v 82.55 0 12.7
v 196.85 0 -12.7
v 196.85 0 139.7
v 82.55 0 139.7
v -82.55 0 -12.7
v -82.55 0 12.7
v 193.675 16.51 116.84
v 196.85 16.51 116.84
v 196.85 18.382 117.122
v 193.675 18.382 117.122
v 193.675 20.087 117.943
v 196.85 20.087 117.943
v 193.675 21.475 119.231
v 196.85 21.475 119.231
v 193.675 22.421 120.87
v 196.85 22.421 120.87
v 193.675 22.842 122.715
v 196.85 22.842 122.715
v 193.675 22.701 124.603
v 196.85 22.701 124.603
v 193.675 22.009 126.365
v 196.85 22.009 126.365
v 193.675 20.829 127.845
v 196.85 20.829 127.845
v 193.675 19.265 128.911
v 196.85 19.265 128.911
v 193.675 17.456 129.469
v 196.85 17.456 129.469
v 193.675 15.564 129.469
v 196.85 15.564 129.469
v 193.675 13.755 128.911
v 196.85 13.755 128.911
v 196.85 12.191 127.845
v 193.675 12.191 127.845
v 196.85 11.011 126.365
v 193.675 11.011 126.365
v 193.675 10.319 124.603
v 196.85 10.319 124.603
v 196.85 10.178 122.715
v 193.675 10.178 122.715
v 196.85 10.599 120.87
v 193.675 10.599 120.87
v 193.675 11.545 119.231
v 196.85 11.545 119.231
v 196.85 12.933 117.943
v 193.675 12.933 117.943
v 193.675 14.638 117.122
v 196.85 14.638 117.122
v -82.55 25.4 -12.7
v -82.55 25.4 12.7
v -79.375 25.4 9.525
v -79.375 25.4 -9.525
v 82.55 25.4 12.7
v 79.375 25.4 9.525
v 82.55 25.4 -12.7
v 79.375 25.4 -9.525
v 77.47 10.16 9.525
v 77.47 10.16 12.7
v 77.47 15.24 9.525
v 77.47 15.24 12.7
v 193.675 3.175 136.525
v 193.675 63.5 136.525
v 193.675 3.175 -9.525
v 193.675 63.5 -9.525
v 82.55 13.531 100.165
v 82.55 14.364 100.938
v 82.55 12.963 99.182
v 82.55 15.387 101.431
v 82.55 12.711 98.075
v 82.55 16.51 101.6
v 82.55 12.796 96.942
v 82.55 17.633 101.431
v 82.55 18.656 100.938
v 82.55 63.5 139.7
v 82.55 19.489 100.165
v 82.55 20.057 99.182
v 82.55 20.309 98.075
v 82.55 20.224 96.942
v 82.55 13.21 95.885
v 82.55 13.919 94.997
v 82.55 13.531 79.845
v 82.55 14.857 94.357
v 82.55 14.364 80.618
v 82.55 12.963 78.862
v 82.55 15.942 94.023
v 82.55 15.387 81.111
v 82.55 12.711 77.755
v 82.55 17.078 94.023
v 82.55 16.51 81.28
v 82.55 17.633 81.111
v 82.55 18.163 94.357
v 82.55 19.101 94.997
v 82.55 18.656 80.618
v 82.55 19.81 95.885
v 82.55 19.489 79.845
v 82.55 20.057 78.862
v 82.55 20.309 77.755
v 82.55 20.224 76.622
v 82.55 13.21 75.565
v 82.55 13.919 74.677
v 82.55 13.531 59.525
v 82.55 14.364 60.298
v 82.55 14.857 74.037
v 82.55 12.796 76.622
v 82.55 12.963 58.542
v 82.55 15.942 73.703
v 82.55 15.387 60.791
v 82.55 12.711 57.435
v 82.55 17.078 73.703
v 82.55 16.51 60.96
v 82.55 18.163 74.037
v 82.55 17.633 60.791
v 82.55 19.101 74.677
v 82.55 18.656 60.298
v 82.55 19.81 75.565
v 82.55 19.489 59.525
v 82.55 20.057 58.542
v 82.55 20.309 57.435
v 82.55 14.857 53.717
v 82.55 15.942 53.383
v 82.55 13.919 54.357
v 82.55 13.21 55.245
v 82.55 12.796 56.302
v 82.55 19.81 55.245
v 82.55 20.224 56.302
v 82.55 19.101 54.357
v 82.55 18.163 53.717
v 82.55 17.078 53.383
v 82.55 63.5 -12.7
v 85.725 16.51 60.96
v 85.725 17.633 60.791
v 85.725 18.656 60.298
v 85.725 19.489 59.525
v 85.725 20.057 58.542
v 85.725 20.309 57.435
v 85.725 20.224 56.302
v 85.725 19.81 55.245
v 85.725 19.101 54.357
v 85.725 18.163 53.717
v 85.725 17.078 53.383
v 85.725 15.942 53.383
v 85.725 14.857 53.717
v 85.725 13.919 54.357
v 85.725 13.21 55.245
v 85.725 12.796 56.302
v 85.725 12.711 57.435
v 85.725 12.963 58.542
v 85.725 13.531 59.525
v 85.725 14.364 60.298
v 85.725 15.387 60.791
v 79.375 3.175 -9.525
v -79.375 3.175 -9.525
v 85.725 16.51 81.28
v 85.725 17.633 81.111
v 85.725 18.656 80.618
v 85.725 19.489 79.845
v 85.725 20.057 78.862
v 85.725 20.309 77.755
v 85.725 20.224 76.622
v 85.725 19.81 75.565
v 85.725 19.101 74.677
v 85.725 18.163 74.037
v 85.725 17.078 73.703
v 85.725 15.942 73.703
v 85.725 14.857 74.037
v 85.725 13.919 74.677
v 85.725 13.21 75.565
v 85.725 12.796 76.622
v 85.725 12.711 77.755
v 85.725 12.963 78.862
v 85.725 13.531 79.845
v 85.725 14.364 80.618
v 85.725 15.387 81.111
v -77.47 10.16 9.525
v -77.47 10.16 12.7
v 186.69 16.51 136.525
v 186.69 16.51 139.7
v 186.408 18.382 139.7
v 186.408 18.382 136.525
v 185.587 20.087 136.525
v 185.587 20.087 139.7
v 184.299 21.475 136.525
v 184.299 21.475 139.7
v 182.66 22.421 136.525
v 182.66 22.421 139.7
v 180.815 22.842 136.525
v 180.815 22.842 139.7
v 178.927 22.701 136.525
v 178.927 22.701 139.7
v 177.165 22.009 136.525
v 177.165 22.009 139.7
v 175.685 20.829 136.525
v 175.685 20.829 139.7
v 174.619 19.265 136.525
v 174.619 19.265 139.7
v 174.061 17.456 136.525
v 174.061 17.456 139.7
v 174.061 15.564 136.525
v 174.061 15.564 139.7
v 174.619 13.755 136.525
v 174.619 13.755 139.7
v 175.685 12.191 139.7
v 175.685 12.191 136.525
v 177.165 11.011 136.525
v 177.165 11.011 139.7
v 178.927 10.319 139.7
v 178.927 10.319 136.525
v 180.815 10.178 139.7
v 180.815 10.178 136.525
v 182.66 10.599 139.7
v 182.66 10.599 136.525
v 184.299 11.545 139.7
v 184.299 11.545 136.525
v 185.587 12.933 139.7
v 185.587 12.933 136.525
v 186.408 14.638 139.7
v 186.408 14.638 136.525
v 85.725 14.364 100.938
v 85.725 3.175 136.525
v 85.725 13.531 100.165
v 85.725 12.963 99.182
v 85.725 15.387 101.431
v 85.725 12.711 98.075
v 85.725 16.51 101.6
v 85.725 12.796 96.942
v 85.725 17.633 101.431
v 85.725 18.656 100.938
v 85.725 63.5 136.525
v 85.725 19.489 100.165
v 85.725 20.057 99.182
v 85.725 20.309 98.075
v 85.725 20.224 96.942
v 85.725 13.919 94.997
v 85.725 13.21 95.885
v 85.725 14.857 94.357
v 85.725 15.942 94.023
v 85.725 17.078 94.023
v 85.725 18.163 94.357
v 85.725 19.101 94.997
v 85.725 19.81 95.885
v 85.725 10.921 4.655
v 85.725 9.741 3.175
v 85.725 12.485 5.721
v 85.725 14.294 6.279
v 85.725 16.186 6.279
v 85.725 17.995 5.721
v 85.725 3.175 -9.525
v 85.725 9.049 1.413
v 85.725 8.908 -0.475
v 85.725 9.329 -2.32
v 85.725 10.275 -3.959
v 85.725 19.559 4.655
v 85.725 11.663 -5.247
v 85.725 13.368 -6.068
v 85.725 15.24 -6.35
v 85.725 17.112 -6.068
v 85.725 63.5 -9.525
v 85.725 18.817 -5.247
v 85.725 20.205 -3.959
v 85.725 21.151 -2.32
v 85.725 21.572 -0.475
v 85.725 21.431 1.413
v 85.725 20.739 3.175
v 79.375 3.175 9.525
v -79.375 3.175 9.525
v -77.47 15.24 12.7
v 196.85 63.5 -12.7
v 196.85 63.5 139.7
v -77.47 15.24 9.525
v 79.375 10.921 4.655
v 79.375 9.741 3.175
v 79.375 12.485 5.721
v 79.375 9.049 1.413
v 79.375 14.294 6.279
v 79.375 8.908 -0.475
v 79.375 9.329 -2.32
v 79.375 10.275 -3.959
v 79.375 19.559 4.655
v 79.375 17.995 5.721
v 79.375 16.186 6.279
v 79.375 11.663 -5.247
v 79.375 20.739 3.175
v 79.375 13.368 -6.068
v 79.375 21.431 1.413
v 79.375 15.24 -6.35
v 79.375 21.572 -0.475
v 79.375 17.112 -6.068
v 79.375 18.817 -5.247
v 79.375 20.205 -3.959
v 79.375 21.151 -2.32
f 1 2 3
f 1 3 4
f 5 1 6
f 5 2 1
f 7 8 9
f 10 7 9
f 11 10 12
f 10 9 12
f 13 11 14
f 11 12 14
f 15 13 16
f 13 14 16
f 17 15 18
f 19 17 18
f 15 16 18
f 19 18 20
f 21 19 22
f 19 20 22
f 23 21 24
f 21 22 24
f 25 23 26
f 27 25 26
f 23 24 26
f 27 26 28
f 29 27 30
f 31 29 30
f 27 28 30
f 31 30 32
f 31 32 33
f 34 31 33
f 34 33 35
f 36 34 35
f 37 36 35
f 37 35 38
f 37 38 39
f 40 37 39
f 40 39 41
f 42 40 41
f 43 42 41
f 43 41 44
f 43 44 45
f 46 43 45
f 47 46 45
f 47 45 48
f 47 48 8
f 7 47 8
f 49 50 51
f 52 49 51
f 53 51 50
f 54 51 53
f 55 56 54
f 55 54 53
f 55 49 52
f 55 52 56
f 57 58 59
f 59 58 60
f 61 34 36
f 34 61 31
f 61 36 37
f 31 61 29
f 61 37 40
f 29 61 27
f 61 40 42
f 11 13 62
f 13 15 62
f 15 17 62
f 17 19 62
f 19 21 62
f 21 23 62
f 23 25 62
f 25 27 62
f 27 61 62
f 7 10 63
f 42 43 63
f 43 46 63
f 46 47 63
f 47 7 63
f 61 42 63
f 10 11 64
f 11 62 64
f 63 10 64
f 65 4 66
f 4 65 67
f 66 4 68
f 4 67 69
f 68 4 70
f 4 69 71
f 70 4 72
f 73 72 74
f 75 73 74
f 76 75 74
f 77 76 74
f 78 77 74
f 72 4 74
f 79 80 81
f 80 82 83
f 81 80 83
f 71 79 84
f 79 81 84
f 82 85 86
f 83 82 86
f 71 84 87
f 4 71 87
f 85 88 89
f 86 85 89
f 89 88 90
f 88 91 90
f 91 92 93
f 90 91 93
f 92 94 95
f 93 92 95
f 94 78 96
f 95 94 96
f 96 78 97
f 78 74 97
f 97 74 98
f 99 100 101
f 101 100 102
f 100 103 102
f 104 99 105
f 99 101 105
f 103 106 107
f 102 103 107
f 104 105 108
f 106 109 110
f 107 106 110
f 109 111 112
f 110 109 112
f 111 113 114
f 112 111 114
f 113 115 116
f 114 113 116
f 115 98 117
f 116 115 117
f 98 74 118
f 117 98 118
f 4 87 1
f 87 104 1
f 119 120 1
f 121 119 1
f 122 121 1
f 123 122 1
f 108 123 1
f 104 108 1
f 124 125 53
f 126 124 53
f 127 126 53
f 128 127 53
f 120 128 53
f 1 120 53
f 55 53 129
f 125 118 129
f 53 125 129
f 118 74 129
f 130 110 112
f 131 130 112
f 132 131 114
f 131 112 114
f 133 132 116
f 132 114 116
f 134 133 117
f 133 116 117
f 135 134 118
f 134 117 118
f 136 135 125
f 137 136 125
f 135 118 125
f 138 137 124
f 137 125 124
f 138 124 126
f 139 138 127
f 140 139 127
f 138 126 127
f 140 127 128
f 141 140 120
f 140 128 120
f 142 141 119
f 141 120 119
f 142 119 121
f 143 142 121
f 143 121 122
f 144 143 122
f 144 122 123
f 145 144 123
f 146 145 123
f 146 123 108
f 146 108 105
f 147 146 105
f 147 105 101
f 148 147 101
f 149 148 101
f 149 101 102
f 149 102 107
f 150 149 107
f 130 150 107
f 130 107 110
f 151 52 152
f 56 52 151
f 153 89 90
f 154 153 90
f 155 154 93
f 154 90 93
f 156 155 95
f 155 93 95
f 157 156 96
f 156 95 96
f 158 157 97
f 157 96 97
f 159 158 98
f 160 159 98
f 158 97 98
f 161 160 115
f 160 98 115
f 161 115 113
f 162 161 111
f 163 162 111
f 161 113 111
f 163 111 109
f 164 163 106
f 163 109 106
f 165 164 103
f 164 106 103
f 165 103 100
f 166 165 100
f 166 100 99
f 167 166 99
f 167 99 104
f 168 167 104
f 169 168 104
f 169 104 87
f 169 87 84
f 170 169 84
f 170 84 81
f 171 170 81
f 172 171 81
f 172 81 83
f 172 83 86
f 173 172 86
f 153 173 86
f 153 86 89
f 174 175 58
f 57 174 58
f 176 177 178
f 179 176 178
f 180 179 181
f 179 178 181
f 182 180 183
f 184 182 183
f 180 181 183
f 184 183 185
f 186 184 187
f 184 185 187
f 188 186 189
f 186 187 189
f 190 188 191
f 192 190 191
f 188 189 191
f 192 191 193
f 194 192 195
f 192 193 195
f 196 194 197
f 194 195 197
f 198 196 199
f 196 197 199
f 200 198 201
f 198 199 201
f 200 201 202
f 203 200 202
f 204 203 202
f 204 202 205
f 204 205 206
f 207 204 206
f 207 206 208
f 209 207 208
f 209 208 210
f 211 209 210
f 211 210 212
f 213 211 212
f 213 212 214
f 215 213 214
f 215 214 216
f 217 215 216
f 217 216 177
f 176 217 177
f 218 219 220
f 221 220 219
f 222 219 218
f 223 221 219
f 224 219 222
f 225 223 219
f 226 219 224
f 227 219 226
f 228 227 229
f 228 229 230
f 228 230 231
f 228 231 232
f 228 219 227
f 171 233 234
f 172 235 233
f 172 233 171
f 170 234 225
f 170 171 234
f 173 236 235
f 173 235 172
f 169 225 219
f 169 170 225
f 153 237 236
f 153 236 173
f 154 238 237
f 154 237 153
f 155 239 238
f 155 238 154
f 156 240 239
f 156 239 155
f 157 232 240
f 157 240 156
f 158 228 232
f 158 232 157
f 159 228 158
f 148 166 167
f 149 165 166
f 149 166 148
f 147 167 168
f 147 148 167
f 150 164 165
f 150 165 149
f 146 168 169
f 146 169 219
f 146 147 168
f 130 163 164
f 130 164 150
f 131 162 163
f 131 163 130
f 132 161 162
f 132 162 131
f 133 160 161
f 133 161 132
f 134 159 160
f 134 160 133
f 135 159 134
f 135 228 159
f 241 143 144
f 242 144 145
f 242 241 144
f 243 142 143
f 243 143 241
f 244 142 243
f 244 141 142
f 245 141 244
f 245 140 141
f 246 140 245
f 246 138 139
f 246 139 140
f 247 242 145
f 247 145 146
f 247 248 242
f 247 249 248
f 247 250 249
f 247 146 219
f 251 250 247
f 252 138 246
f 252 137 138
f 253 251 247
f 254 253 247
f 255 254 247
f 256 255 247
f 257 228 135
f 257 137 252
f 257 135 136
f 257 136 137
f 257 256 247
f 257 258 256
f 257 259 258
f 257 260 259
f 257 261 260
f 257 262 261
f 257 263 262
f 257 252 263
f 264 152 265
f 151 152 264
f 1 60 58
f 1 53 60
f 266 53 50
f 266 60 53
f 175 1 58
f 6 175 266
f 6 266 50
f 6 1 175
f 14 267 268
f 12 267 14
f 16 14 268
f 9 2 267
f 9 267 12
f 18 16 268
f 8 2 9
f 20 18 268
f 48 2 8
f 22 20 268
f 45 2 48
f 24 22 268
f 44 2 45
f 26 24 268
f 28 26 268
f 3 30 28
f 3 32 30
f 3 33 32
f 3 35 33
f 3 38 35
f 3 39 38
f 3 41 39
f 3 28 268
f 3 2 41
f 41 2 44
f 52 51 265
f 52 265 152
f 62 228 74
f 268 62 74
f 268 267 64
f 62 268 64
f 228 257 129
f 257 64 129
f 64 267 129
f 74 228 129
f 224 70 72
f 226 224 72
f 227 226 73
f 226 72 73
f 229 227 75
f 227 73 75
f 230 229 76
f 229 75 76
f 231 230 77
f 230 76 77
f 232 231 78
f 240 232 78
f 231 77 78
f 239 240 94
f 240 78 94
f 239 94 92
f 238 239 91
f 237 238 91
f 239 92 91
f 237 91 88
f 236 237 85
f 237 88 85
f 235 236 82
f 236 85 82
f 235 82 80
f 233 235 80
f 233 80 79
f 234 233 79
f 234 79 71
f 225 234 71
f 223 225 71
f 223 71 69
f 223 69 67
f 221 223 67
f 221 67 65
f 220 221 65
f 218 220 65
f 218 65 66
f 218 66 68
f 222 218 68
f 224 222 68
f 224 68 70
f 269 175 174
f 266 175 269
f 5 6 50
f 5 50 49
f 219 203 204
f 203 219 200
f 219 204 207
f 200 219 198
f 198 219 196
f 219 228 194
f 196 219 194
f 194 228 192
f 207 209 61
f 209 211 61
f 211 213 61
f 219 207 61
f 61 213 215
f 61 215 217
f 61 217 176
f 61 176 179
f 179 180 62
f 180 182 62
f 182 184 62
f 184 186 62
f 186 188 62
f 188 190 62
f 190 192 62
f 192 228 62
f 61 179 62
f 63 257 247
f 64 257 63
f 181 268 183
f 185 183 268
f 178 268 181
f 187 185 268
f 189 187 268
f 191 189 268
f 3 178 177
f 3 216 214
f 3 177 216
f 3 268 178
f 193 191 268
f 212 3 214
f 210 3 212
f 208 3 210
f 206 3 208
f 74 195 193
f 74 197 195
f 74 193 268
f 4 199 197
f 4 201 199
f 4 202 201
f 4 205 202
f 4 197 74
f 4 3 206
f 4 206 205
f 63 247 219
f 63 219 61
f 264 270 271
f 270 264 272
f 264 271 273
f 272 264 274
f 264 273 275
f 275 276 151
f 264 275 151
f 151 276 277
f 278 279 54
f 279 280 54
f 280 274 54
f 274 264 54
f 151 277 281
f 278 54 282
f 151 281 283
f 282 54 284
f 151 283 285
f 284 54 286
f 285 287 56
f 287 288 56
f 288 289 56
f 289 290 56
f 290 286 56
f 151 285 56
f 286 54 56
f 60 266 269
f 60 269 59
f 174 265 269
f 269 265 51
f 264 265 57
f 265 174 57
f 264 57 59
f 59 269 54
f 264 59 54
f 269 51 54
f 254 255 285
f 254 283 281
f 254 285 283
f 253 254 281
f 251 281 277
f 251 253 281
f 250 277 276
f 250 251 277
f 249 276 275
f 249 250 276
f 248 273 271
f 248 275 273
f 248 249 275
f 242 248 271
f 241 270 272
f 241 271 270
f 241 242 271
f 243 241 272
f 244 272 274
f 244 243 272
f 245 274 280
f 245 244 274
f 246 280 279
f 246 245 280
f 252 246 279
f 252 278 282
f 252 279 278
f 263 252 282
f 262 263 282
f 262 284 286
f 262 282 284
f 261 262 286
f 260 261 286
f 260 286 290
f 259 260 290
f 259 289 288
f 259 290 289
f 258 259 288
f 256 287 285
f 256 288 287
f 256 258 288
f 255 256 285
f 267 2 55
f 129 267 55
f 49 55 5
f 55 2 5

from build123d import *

# Parameters (mm, degrees)
BOSS_EXTRUDE1_DEPTH     = 63.5
SKETCH2_W               = 165.1
SKETCH2_H               = 25.4
CUT_EXTRUDE1_DEPTH      = 38.1
SKETCH3_W               = 107.95
SKETCH3_H               = 146.05
CUT_EXTRUDE2_DEPTH      = 60.325
SKETCH4_W               = 158.75
SKETCH4_H               = 19.05
CUT_EXTRUDE3_DEPTH      = 22.225
CUT_EXTRUDE5_DEPTH      = 20.32
CUT_EXTRUDE5_DEPTH_BACK = 20.32
SKETCH5_R               = 6.35
SKETCH6_W               = 154.94
SKETCH6_H               = 5.08
CUT_EXTRUDE6_DEPTH      = 10.16
SKETCH8_R               = 3.81
CUT_EXTRUDE8_DEPTH      = 12.7
SKETCH9_R               = 6.35
CUT_EXTRUDE9_DEPTH      = 12.7
SKETCH10_R              = 6.35
CUT_EXTRUDE10_DEPTH     = 12.7


with BuildPart() as part:
    # Sketch1 → Boss-Extrude1 (new body)
    with BuildSketch(Plane(origin=(0, 0, 0), x_dir=(1, 0, 0), z_dir=(0, 1, 0))):
        Polygon((-82.55, 12.7), (82.55, 12.7), (196.85, 12.7), (196.85, -139.7), (82.55, -139.7), (82.55, -12.7), (-82.55, -12.7), align=None)
    extrude(amount=BOSS_EXTRUDE1_DEPTH)

    # Sketch2 → Cut-Extrude1 (cut)
    with BuildSketch(Plane(origin=(0, 63.5, 0), x_dir=(1, 0, 0), z_dir=(0, 1, 0))):
        Rectangle(SKETCH2_W, SKETCH2_H)
    extrude(amount=-CUT_EXTRUDE1_DEPTH, mode=Mode.SUBTRACT)

    # Sketch3 → Cut-Extrude2 (cut)
    with BuildSketch(Plane(origin=(0, 63.5, 0), x_dir=(1, 0, 0), z_dir=(0, 1, 0))):
        with Locations((139.7, -63.5)):
            Rectangle(SKETCH3_W, SKETCH3_H)
    extrude(amount=-CUT_EXTRUDE2_DEPTH, mode=Mode.SUBTRACT)

    # Sketch4 → Cut-Extrude3 (cut)
    with BuildSketch(Plane(origin=(0, 25.4, 0), x_dir=(1, 0, 0), z_dir=(0, 1, 0))):
        Rectangle(SKETCH4_W, SKETCH4_H)
    extrude(amount=-CUT_EXTRUDE3_DEPTH, mode=Mode.SUBTRACT)

    # Sketch5 → Cut-Extrude5 (cut, two sides: drawn at the far end of the back side and taken through both)
    with BuildSketch(Plane.ZY.offset(-79.375).offset(-CUT_EXTRUDE5_DEPTH_BACK)):
        with Locations(Location((0, 15.24, 0), (0, 0, 180))):
            Circle(SKETCH5_R)
    extrude(amount=CUT_EXTRUDE5_DEPTH + CUT_EXTRUDE5_DEPTH_BACK, mode=Mode.SUBTRACT)

    # Sketch6 → Cut-Extrude6 (cut)
    with BuildSketch(Plane.XY.offset(12.7)):
        with Locations((0, 12.7)):
            Rectangle(SKETCH6_W, SKETCH6_H)
    extrude(amount=-CUT_EXTRUDE6_DEPTH, mode=Mode.SUBTRACT)

    # Sketch8 → Cut-Extrude8 (cut)
    with BuildSketch(Plane.ZY.offset(-82.55)):
        with Locations((57.15, 16.51)):
            Circle(SKETCH8_R)
        with Locations((77.47, 16.51)):
            Circle(SKETCH8_R)
        with Locations((97.79, 16.51)):
            Circle(SKETCH8_R)
    extrude(amount=-CUT_EXTRUDE8_DEPTH, mode=Mode.SUBTRACT)

    # Sketch9 → Cut-Extrude9 (cut)
    with BuildSketch(Plane.XY.offset(139.7)):
        with Locations((180.34, 16.51)):
            Circle(SKETCH9_R)
    extrude(amount=-CUT_EXTRUDE9_DEPTH, mode=Mode.SUBTRACT)

    # Sketch10 → Cut-Extrude10 (cut)
    with BuildSketch(Plane(origin=(196.85, 0, 0), x_dir=(0, 0, -1), z_dir=(1, 0, 0))):
        with Locations((-123.19, 16.51)):
            Circle(SKETCH10_R)
    extrude(amount=-CUT_EXTRUDE10_DEPTH, mode=Mode.SUBTRACT)


solid = part.part
